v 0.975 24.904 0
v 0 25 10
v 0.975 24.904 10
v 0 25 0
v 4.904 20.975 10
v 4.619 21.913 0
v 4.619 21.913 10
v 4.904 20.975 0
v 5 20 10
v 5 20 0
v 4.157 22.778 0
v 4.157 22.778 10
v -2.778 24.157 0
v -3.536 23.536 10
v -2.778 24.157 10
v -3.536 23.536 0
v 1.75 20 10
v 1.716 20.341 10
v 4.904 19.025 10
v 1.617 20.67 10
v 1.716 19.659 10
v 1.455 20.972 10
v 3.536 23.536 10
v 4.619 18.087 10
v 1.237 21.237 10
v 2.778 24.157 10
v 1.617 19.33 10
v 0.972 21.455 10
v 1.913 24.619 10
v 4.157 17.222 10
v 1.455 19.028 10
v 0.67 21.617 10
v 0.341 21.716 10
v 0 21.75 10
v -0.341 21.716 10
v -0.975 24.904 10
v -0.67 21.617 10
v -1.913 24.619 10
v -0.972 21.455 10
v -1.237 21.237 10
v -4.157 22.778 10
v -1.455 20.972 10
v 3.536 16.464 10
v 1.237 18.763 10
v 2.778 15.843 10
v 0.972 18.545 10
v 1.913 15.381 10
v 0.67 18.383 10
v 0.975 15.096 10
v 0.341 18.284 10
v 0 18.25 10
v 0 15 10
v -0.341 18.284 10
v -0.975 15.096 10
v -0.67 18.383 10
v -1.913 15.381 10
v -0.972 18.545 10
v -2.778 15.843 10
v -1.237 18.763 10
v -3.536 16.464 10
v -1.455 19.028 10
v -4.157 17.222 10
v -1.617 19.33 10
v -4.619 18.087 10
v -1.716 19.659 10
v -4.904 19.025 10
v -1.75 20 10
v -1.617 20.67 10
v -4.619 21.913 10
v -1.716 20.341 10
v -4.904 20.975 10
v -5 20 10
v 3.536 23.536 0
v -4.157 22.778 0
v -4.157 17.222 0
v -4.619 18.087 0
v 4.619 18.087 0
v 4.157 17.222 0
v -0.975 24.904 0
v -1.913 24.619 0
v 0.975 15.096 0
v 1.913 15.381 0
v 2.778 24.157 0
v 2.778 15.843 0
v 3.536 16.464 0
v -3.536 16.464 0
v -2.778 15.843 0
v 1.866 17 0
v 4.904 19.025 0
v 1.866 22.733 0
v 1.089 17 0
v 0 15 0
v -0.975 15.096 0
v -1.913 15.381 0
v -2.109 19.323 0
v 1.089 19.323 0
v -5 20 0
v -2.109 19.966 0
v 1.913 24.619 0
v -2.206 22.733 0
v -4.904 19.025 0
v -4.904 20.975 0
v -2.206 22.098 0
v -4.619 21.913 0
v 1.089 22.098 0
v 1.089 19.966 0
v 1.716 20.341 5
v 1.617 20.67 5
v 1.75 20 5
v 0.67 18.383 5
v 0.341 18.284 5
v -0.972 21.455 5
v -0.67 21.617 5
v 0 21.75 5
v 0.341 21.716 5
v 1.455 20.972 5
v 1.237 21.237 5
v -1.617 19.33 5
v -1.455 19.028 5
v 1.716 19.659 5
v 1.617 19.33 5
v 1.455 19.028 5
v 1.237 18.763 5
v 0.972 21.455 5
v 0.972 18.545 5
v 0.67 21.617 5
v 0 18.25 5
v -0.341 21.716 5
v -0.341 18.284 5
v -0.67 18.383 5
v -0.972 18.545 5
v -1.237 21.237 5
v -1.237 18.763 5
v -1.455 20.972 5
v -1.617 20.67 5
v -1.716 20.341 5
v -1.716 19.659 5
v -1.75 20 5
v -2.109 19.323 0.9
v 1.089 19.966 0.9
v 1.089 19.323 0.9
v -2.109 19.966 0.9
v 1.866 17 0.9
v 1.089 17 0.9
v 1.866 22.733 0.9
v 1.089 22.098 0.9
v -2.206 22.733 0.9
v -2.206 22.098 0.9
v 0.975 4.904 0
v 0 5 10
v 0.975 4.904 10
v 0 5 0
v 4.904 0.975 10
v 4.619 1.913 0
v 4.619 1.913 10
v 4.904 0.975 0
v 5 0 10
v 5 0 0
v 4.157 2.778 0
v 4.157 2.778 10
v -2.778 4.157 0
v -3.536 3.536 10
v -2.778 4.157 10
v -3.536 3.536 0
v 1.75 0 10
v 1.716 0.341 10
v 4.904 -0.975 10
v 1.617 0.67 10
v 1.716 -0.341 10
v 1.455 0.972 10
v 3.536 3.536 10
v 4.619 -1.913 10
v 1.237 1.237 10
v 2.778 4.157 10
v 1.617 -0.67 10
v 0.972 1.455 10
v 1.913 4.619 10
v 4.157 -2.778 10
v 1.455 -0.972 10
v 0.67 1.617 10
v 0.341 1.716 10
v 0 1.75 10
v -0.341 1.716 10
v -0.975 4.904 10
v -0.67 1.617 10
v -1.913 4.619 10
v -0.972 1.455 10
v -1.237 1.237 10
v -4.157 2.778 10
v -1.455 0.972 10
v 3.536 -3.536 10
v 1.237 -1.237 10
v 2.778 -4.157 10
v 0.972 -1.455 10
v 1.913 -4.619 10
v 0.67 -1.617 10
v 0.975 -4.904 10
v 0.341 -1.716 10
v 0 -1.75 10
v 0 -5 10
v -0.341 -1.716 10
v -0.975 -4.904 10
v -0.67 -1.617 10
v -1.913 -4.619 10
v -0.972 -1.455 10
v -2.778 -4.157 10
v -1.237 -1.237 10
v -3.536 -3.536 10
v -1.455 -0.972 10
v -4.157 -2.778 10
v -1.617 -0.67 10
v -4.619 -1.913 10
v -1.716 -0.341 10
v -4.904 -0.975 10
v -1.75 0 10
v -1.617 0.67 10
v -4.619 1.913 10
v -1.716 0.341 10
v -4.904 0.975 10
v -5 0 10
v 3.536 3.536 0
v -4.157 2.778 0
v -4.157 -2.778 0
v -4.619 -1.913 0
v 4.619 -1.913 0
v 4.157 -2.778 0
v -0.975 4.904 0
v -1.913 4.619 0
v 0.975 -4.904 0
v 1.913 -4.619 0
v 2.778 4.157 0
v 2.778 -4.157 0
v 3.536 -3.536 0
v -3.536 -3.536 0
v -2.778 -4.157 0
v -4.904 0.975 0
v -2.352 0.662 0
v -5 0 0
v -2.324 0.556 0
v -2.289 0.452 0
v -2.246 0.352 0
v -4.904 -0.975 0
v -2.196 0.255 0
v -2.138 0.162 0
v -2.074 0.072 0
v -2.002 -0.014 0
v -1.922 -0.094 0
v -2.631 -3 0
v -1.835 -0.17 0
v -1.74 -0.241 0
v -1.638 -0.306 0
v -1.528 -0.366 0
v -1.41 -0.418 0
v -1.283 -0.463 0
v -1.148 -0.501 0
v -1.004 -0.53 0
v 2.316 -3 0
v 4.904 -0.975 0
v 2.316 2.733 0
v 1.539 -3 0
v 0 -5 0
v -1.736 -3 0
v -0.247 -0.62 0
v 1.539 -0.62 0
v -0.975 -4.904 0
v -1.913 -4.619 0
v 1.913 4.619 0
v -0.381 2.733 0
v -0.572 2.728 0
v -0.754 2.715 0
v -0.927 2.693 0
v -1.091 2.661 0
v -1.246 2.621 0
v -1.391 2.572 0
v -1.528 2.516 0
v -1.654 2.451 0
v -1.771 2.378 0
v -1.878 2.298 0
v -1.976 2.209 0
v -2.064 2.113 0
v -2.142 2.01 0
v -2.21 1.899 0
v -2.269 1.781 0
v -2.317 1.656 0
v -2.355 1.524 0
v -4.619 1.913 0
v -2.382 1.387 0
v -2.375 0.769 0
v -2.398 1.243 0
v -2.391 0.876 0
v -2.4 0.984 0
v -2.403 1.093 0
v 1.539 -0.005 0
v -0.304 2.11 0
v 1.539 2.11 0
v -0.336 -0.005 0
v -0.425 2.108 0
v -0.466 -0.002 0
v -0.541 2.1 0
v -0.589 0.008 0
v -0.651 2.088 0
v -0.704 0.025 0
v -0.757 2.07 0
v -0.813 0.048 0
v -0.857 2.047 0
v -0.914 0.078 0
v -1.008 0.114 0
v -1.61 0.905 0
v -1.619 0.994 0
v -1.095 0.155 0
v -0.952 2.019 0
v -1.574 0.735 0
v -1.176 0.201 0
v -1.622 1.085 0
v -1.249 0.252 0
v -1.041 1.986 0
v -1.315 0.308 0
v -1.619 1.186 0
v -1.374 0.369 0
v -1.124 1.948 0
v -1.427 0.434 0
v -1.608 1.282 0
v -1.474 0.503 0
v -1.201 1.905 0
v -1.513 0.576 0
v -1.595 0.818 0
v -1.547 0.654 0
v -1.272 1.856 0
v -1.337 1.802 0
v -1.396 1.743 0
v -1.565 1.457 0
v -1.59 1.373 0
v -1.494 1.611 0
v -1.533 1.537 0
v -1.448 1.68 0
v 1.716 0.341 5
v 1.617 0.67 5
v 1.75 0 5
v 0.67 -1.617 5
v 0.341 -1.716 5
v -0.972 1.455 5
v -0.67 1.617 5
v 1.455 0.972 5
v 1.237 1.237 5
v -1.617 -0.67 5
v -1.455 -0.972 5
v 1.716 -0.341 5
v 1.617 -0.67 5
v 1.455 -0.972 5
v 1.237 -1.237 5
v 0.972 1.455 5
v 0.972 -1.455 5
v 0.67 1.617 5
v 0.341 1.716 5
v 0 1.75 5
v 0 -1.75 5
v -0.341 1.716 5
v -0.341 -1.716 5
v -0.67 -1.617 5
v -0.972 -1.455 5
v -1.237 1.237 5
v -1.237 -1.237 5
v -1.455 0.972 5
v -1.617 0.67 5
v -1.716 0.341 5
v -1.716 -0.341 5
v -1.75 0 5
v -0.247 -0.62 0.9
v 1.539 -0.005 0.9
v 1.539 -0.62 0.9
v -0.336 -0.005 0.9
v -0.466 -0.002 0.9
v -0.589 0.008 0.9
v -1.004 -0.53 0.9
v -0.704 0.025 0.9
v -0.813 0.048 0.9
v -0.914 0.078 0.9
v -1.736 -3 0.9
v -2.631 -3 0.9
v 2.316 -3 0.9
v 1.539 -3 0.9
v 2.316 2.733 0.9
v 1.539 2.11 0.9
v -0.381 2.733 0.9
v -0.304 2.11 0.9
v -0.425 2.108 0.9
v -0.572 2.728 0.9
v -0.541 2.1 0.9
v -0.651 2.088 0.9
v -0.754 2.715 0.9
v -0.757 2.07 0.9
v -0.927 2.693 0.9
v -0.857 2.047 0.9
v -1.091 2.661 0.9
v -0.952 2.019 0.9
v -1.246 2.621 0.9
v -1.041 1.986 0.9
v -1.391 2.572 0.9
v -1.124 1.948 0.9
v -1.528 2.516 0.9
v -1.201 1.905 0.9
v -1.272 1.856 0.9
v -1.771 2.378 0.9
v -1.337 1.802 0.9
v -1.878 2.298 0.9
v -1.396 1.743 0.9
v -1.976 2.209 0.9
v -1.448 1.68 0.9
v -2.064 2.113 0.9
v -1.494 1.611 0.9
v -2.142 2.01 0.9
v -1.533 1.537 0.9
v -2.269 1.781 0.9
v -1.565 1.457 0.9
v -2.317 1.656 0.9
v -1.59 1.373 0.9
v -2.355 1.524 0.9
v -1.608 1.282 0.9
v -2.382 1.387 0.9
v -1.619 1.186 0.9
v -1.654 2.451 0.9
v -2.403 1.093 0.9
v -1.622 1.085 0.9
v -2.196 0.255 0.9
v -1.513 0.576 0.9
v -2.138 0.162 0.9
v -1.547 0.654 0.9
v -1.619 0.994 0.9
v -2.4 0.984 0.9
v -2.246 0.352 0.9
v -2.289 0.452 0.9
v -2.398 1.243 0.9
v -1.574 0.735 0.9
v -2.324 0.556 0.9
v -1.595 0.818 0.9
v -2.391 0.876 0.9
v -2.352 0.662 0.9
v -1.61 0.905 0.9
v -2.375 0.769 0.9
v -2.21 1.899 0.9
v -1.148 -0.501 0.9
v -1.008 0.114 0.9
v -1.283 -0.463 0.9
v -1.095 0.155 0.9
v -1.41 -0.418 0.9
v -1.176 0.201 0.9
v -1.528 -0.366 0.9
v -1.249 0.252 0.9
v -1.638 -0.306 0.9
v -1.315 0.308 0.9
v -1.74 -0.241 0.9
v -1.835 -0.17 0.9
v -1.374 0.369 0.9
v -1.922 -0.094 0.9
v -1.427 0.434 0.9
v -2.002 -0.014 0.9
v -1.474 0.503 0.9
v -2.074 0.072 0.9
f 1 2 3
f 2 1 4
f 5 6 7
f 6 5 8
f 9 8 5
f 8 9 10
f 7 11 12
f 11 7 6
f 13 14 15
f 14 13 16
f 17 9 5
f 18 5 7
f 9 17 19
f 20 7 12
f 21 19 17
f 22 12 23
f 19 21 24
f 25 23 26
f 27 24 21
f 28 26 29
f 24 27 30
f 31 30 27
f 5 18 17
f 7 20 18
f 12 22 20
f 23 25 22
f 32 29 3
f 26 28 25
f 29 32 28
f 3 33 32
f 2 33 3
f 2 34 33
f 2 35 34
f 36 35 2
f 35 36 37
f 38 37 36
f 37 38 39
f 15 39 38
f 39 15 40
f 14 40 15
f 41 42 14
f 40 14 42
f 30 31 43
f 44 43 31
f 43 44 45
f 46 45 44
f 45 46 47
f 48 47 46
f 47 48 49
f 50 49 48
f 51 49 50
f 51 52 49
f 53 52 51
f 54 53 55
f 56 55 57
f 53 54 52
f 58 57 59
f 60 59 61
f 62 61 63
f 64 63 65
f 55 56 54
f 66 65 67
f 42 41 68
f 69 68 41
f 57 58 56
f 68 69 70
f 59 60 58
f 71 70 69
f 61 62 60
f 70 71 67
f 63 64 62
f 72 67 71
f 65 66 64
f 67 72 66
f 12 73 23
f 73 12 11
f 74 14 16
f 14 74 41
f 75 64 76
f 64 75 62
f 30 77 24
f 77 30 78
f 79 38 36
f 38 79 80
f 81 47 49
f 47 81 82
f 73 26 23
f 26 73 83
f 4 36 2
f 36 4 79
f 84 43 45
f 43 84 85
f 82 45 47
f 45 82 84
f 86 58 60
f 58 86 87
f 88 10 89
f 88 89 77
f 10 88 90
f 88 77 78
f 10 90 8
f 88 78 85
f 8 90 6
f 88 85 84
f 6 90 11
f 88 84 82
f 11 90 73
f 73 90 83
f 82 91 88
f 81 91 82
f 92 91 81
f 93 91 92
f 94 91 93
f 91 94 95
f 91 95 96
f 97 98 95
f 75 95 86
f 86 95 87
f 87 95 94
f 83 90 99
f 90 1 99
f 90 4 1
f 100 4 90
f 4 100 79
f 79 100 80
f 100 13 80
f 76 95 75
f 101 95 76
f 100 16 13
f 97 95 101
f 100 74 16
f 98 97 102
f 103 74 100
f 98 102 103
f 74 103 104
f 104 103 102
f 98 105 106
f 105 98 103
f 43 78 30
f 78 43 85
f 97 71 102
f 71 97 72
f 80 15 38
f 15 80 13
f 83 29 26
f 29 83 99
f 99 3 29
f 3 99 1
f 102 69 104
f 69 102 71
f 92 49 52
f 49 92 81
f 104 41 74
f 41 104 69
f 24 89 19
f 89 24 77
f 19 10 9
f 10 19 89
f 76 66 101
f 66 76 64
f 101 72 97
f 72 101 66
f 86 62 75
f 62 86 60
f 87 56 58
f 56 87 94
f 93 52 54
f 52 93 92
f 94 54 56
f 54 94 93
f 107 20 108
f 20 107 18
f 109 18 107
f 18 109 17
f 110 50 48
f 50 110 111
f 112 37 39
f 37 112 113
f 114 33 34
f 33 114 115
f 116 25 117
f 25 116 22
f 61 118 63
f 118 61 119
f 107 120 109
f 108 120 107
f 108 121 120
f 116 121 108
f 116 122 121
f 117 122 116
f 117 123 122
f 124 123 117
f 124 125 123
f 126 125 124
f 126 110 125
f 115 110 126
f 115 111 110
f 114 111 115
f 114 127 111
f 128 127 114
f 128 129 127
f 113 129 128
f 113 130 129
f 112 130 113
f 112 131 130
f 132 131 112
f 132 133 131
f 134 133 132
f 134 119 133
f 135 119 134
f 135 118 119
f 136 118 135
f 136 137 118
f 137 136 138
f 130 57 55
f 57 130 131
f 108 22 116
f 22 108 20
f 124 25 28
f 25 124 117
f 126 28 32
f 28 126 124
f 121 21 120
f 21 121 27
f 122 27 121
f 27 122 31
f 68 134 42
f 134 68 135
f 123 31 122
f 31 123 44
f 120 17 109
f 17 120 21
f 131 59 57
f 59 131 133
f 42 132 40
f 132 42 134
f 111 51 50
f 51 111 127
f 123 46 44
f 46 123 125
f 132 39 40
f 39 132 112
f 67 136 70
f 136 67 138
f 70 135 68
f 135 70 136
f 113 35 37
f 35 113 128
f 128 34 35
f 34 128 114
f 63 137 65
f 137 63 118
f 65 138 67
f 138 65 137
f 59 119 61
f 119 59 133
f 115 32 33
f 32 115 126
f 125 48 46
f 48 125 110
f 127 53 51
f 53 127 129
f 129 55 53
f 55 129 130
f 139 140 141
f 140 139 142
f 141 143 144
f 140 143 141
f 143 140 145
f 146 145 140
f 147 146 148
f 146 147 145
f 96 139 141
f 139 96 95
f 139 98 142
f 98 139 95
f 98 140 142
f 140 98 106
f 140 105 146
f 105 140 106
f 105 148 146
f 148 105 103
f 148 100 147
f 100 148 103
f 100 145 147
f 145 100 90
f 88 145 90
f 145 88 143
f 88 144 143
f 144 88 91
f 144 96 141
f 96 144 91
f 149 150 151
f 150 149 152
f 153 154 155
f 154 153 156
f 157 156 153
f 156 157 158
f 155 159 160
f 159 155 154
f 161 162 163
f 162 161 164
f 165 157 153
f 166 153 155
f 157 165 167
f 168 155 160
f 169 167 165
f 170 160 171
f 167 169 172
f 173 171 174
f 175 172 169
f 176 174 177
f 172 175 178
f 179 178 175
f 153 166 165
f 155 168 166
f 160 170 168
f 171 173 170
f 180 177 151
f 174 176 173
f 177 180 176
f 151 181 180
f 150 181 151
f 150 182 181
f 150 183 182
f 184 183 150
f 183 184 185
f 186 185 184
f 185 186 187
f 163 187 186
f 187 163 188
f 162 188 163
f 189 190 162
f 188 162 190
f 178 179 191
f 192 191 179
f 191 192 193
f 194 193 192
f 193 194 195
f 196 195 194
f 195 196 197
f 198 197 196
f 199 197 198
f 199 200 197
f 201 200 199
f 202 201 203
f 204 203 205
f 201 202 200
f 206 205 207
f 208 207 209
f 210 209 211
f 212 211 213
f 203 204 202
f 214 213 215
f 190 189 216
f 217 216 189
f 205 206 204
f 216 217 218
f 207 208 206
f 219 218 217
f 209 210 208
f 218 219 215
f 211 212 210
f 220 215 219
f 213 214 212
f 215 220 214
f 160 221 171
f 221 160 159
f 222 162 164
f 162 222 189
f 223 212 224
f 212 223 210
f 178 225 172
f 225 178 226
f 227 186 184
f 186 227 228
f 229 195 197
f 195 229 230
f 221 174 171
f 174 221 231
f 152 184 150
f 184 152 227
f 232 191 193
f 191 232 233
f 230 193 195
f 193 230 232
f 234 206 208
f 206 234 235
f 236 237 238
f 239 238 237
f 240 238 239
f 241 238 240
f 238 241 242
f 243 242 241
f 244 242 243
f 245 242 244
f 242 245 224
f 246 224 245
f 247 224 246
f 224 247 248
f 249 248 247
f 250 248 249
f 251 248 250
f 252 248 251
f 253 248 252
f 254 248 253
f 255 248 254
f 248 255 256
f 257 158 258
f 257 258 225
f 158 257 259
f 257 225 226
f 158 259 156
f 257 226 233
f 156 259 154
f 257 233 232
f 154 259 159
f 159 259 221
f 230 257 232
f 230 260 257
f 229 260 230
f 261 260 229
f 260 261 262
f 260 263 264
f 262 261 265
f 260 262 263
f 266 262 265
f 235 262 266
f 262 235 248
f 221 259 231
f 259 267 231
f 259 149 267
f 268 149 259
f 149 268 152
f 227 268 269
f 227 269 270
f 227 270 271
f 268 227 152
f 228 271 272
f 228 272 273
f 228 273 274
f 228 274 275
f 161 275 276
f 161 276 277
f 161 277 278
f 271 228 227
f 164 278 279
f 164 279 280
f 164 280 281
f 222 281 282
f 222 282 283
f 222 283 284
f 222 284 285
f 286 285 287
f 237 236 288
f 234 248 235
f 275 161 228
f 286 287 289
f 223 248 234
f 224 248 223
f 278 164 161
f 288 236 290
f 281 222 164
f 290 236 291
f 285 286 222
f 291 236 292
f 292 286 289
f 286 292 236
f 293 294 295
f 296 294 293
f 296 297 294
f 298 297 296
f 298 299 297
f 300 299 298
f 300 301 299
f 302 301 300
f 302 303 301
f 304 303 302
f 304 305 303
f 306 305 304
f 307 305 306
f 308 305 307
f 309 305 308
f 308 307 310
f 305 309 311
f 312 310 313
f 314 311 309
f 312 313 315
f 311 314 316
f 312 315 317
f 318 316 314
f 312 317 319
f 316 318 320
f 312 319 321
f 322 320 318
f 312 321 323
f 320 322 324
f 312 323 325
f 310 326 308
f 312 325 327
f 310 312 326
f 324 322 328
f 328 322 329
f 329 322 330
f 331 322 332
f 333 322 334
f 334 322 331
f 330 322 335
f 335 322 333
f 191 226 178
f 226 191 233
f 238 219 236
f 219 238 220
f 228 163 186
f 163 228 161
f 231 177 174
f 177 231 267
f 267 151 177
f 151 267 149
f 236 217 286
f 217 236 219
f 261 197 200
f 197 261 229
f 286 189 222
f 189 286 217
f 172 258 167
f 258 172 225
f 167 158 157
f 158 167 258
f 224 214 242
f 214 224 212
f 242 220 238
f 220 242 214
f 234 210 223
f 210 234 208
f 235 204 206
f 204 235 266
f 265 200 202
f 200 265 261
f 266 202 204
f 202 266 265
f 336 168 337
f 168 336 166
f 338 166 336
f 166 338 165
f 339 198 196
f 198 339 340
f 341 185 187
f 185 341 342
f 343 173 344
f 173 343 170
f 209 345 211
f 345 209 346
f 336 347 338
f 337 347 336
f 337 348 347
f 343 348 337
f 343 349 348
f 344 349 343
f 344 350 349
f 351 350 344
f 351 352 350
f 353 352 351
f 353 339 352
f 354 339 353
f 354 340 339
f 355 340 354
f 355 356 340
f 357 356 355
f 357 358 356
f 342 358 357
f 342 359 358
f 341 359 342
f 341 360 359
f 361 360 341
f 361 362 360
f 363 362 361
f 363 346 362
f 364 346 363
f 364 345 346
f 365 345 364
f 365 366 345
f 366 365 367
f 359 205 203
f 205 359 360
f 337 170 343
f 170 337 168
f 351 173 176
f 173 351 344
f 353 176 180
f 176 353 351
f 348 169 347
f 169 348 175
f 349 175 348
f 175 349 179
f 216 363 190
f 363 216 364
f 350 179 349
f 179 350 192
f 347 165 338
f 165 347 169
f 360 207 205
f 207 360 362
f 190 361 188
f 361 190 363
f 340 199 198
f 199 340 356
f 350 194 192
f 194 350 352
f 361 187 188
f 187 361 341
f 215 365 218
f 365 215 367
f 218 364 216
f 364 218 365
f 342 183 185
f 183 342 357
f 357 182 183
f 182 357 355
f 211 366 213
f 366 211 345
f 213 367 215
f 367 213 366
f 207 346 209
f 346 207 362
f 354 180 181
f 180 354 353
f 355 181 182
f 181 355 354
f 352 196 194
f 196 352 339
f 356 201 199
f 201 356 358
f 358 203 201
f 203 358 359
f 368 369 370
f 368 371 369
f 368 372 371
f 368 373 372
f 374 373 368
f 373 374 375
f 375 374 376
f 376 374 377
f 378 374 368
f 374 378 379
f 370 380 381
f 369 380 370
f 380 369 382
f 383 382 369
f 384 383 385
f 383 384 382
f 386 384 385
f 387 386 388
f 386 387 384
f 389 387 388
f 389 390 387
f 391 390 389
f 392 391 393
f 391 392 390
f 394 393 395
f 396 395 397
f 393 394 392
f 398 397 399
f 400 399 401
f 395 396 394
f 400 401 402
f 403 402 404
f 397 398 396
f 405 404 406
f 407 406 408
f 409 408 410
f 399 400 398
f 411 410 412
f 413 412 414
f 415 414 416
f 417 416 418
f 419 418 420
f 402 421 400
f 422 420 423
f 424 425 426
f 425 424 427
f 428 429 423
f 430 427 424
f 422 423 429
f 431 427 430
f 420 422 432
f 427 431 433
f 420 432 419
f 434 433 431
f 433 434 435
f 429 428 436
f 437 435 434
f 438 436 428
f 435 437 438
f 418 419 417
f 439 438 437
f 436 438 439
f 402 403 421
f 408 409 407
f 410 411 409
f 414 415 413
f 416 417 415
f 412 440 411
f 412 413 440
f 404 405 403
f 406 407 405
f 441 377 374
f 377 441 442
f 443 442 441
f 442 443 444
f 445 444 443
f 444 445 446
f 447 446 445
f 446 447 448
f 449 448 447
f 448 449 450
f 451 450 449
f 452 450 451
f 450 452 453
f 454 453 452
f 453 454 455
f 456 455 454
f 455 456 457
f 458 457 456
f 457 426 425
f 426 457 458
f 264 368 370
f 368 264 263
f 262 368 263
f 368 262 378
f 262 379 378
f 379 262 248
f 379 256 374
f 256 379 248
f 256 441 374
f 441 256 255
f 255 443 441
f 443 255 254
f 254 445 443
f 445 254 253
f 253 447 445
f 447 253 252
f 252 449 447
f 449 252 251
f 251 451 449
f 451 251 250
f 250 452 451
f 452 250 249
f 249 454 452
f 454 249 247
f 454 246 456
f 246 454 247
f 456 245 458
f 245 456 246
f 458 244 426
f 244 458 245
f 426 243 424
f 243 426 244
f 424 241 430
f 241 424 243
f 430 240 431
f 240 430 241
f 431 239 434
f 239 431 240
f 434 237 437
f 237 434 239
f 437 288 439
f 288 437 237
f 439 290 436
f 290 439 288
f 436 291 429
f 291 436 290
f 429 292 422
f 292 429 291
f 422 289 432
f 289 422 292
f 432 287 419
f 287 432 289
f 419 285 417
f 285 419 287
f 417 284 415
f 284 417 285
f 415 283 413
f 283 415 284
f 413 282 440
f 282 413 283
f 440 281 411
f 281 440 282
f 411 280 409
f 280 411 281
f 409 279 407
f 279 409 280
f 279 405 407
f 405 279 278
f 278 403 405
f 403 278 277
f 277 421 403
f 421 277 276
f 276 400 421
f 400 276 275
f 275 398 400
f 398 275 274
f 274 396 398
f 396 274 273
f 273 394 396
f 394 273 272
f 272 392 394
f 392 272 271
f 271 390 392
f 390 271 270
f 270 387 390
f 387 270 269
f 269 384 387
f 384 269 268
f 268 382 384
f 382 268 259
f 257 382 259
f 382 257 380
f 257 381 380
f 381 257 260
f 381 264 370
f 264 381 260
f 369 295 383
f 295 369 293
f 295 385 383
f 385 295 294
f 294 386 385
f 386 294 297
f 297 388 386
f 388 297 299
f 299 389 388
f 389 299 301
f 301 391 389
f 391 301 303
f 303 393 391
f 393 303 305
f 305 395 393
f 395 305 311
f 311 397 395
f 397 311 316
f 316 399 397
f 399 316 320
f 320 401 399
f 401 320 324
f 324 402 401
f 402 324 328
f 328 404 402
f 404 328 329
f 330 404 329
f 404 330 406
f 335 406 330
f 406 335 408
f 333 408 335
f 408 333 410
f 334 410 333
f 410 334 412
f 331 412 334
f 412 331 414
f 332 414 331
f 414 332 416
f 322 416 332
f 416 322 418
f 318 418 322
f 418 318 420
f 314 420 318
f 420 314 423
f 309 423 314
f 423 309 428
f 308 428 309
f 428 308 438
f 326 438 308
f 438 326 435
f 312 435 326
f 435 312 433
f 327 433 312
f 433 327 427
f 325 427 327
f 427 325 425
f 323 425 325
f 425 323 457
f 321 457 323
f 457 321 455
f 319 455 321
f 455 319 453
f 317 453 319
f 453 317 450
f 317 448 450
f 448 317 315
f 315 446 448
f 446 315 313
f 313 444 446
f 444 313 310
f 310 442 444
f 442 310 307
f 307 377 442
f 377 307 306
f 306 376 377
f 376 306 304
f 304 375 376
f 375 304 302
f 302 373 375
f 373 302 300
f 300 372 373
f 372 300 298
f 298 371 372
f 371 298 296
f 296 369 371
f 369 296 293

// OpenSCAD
buttonDia=10;
buttonH=10;
buttonC=3.5;
holeDepth=5;
textSize=6;
pad=0.1;
$fn=32;

module button(label,adj)
{
	difference()
	{
		cylinder(r=buttonDia/2,h=buttonH);
		translate([0,0,buttonH-holeDepth])
			cylinder(r=buttonC/2,h=holeDepth+pad);
		translate([textSize/2*adj,-textSize/2,1-pad])
			rotate([0,180,0])
				linear_extrude(height=1)
					text(label,font="Arial",size=textSize);
	}
}

translate([0,20,0])
	button("F",.85);
button("R",1);
